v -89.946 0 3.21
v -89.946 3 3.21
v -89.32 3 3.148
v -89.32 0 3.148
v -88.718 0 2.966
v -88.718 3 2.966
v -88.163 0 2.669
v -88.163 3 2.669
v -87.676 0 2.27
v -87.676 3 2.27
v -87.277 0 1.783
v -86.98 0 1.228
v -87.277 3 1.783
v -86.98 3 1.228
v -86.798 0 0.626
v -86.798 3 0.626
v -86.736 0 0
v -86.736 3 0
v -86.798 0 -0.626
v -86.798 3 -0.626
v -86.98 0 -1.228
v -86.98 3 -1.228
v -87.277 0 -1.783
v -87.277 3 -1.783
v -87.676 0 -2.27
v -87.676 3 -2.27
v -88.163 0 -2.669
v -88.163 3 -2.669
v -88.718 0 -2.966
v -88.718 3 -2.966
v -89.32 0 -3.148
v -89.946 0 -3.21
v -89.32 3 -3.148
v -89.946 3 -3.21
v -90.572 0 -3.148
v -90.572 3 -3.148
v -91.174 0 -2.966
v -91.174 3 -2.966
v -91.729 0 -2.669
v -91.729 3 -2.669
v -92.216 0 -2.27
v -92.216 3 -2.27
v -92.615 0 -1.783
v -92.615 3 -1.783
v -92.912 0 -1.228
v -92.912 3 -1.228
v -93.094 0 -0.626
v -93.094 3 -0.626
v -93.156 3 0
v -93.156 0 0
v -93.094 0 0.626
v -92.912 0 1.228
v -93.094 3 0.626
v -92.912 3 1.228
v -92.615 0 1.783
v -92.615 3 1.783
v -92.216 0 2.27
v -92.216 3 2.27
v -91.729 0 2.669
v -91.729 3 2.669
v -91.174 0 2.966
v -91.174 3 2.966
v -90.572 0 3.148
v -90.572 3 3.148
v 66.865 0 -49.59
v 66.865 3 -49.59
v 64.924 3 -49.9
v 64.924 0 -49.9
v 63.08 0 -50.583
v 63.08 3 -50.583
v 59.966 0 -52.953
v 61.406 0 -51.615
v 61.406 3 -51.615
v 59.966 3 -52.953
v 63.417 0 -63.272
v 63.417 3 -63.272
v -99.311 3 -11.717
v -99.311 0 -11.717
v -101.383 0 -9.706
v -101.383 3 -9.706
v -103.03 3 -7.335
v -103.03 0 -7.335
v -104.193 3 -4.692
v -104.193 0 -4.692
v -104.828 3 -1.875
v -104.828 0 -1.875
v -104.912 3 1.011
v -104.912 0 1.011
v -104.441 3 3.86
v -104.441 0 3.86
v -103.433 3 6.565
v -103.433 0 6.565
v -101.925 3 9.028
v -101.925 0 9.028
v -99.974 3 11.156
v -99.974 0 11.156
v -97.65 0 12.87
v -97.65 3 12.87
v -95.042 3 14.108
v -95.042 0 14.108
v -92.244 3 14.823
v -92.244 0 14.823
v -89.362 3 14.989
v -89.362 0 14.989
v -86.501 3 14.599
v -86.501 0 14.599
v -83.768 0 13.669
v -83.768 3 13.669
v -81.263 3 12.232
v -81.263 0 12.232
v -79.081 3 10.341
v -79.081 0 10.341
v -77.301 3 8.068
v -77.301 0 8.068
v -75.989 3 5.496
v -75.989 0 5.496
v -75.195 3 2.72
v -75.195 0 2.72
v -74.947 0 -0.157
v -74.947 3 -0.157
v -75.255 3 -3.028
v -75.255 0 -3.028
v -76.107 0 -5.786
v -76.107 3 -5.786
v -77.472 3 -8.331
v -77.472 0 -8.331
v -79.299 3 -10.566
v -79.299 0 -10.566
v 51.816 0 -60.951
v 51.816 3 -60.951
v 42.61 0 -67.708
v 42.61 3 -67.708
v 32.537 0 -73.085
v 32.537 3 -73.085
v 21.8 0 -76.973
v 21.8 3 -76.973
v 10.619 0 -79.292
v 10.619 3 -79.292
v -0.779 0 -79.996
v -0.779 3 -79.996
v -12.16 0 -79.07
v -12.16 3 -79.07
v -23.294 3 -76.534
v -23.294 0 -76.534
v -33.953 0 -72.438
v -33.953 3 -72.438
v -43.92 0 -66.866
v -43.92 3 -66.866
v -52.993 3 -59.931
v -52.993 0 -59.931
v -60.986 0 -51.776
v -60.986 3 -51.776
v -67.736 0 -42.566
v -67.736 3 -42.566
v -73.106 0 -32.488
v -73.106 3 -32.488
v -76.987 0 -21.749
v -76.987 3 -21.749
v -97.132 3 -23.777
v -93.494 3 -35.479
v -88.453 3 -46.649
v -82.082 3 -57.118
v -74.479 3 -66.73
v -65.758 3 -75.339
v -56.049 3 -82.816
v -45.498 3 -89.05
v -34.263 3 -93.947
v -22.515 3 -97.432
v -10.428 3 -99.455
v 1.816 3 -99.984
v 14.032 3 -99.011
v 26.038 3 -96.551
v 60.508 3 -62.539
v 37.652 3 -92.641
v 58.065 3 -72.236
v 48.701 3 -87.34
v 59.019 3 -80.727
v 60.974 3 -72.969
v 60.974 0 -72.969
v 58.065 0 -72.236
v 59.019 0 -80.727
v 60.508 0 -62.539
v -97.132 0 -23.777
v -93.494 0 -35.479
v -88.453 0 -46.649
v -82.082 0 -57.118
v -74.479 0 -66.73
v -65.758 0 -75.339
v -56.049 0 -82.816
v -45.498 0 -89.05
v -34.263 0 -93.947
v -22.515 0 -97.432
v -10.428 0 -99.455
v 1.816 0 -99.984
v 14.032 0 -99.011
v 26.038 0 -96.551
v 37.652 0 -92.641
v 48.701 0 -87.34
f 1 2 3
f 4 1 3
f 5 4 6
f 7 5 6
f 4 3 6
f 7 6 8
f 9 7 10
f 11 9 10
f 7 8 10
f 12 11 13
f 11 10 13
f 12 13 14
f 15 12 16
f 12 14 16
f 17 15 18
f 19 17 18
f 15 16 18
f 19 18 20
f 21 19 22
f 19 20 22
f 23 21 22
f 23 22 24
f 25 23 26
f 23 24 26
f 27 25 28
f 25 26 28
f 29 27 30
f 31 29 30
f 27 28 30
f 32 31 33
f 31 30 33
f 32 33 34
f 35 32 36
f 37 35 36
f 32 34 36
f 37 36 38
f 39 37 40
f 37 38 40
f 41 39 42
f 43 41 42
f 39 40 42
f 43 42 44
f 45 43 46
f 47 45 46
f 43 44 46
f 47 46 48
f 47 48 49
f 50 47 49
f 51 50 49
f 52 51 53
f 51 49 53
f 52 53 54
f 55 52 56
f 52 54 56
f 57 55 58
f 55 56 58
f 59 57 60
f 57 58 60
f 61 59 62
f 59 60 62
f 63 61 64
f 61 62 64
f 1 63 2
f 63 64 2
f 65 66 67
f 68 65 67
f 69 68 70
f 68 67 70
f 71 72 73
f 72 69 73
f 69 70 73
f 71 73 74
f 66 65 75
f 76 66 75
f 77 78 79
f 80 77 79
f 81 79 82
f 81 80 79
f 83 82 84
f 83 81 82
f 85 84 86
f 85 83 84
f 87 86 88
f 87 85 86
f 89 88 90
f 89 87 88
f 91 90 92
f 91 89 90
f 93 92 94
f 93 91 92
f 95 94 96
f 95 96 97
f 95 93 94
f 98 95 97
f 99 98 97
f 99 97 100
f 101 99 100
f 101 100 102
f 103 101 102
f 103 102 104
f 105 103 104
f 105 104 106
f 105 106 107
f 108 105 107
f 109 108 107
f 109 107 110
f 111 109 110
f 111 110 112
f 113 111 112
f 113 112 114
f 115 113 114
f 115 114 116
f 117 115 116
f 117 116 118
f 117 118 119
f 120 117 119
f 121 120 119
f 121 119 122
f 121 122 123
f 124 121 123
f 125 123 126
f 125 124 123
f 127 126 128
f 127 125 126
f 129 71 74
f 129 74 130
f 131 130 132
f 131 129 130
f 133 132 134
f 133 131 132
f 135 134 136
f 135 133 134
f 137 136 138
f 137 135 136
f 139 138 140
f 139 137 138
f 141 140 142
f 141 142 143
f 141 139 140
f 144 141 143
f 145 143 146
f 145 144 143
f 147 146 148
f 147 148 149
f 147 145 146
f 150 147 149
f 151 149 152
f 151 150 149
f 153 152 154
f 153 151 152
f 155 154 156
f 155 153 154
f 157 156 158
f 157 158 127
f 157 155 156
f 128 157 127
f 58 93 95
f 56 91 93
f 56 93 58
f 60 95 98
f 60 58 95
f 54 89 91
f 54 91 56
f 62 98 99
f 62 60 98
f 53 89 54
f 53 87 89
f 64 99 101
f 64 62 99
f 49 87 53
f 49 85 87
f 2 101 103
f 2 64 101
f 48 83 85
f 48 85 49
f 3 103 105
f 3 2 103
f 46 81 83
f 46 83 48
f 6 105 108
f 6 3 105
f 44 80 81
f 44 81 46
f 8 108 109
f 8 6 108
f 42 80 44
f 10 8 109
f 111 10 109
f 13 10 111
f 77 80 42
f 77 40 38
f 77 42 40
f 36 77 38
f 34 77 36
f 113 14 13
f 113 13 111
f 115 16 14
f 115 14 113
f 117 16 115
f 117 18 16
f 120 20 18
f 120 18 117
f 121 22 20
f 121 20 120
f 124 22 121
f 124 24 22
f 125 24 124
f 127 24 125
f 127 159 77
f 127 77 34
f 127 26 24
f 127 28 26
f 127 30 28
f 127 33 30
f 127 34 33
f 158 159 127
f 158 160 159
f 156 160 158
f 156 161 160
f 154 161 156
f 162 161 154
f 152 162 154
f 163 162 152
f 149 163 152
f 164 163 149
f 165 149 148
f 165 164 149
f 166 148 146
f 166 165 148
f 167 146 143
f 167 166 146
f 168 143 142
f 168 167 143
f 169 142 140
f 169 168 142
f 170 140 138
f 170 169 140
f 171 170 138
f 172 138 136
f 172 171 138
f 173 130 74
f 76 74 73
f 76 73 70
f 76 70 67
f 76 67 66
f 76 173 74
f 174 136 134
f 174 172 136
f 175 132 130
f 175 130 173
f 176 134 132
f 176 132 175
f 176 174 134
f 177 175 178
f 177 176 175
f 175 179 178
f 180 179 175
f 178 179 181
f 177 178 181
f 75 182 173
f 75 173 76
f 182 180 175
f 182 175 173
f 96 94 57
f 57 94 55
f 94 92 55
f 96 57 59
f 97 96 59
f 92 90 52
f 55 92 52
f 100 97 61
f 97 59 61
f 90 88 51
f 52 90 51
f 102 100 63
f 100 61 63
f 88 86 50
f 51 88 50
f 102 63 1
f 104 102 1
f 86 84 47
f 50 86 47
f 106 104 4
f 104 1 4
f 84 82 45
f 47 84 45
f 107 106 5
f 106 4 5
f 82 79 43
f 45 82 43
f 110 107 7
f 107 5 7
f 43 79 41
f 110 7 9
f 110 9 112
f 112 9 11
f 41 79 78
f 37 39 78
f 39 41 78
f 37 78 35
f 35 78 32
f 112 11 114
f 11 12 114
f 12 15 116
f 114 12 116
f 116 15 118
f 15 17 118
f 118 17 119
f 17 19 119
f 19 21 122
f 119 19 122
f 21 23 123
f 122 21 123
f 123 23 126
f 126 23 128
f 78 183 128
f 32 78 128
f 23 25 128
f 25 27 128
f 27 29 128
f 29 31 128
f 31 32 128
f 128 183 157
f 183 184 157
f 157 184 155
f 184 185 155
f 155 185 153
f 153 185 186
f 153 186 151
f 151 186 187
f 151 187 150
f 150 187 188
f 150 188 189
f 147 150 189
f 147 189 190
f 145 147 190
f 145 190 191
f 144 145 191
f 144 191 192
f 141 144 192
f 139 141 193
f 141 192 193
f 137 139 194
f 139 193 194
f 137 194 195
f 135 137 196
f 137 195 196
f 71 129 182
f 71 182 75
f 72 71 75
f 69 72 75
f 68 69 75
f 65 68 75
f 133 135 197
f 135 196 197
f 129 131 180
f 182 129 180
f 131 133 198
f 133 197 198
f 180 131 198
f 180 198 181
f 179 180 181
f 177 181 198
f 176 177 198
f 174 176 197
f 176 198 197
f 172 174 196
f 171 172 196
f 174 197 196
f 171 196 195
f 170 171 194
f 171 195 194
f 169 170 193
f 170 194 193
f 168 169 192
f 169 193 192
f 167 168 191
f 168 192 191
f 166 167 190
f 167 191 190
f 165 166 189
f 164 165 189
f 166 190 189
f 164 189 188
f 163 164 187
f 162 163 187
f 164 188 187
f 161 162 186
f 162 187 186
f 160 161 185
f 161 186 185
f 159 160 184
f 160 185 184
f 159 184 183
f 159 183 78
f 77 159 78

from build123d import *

# Parameters (mm, degrees)
SKETCH3_R              = 100
SKETCH3_R_2            = 80
BOSS_EXTRUDE1_DEPTH    = 3
SPLIT2_SURFACE_1_BACK  = 283.859
SPLIT2_SURFACE_1_DEPTH = 567.718
SPLIT2_SURFACE_2_BACK  = 283.859
SPLIT2_SURFACE_2_DEPTH = 567.718
BODY_DELETE1_DEPTH     = 3
SKETCH5_R              = 15
BOSS_EXTRUDE2_DEPTH    = 3
SKETCH6_R              = 3.21
CUT_EXTRUDE1_DEPTH     = 3
SPLIT3_SURFACE_3_BACK  = 209.781
SPLIT3_SURFACE_3_DEPTH = 419.562
SPLIT3_SURFACE_4_BACK  = 209.781
SPLIT3_SURFACE_4_DEPTH = 419.562
SPLIT4_SURFACE_5_BACK  = 209.781
SPLIT4_SURFACE_5_DEPTH = 419.562
SPLIT4_SURFACE_6_BACK  = 209.781
SPLIT4_SURFACE_6_DEPTH = 419.562
FILLET1_R              = 10
SPLIT5_SURFACE_7_BACK  = 207.768
SPLIT5_SURFACE_7_DEPTH = 415.536
SPLIT5_SURFACE_8_BACK  = 207.768
SPLIT5_SURFACE_8_DEPTH = 415.536


# Read off the part's stored shape, not the designer's step: Body-Delete1
with BuildPart() as part:
    # Sketch3 → Boss-Extrude1 (new body)
    with BuildSketch(Plane(origin=(0, 0, 0), x_dir=(1, 0, 0), z_dir=(0, 1, 0))):
        with Locations(Location((0, 0, 0), (0, 0, 270))):
            Circle(SKETCH3_R)
        with Locations(Location((0, 0, 0), (0, 0, 270))):
            Circle(SKETCH3_R_2, mode=Mode.SUBTRACT)
    extrude(amount=BOSS_EXTRUDE1_DEPTH)


with BuildPart() as body_2:
    # Split2: the piece behind the surface
    add(part.part)
    # Split2 surface: a surface, the sketch's curves swept straight by 567.718 mm
    with BuildLine(Plane(origin=(0, 3, 0), x_dir=(1, 0, 0), z_dir=(0, 1, 0)).offset(-SPLIT2_SURFACE_1_BACK), mode=Mode.PRIVATE) as split2_surface_1_path:
        Line((69.282032303, 72.111025509), (69.282032303, 40))
        Line((69.282032303, 40), (69.282032303, 0))
        Line((69.282032303, 0), (-114.167790304, 0))
        Line((-114.167790304, 0), (-114.167790304, -108.297460661))
        Line((-114.167790304, -108.297460661), (110.524137422, -108.297460661))
        Line((110.524137422, -108.297460661), (110.524137422, 72.111025509))
        Line((110.524137422, 72.111025509), (69.282032303, 72.111025509))
    split2_surface_1 = Shell.extrude(split2_surface_1_path.wire(), (0 * SPLIT2_SURFACE_1_DEPTH, 1 * SPLIT2_SURFACE_1_DEPTH, 0 * SPLIT2_SURFACE_1_DEPTH))
    split(bisect_by=split2_surface_1, keep=Keep.BOTTOM)

    # Sketch5 → Boss-Extrude2 (add)
    with BuildSketch(Plane(origin=(0, 3, 0), x_dir=(1, 0, 0), z_dir=(0, 1, 0))):
        with Locations((-89.945938306, 0)):
            Circle(SKETCH5_R)
    extrude(amount=-BOSS_EXTRUDE2_DEPTH)

    # Sketch6 → Cut-Extrude1 (cut)
    with BuildSketch(Plane(origin=(0, 3, 0), x_dir=(1, 0, 0), z_dir=(0, 1, 0))):
        with Locations(Location((-89.945938306, 0, 0), (0, 0, 270))):
            Circle(SKETCH6_R)
    extrude(amount=-CUT_EXTRUDE1_DEPTH, mode=Mode.SUBTRACT)


with BuildPart() as part_1:
    add(part.part)

    # Split2: split by a surface, the side it looks to stays
    # Split2 surface: a surface, the sketch's curves swept straight by 567.718 mm
    with BuildLine(Plane(origin=(0, 3, 0), x_dir=(1, 0, 0), z_dir=(0, 1, 0)).offset(-SPLIT2_SURFACE_2_BACK), mode=Mode.PRIVATE) as split2_surface_2_path:
        Line((69.282032303, 72.111025509), (69.282032303, 40))
        Line((69.282032303, 40), (69.282032303, 0))
        Line((69.282032303, 0), (-114.167790304, 0))
        Line((-114.167790304, 0), (-114.167790304, -108.297460661))
        Line((-114.167790304, -108.297460661), (110.524137422, -108.297460661))
        Line((110.524137422, -108.297460661), (110.524137422, 72.111025509))
        Line((110.524137422, 72.111025509), (69.282032303, 72.111025509))
    split2_surface_2 = Shell.extrude(split2_surface_2_path.wire(), (0 * SPLIT2_SURFACE_2_DEPTH, 1 * SPLIT2_SURFACE_2_DEPTH, 0 * SPLIT2_SURFACE_2_DEPTH))
    split(bisect_by=split2_surface_2, keep=Keep.TOP)

    # Body-Delete1 outline → Body-Delete1 (cut)
    with BuildSketch(Plane(origin=(0, 0, 0), x_dir=(1, 0, 0), z_dir=(0, 1, 0))):
        with BuildLine():
            ThreePointArc((-100, 0), (39.190539482, -92.000552255), (69.282032303, 72.111025509))
            Line((69.282032303, 72.111025509), (69.282032303, 40))
            ThreePointArc((69.282032303, 40), (20.705523608, -77.274066103), (-80, 0))
            Line((-80, 0), (-100, 0))
        make_face()
    extrude(amount=BODY_DELETE1_DEPTH, mode=Mode.SUBTRACT)


with BuildPart() as body_2_2:
    # Split3: the piece behind the surface
    add(body_2.part)
    # Split3 surface: a surface, the sketch's curves swept straight by 419.562 mm
    with BuildLine(Plane(origin=(0, 3, 0), x_dir=(1, 0, 0), z_dir=(0, 1, 0)).offset(-SPLIT3_SURFACE_3_BACK), mode=Mode.PRIVATE) as split3_surface_3_path:
        Line((69.282032303, 40), (59.018656665, 80.726688062))
        Line((59.018656665, 80.726688062), (73.479070656, 80.726688062))
        Line((73.479070656, 80.726688062), (69.282032303, 40))
    split3_surface_3 = Shell.extrude(split3_surface_3_path.wire(), (0 * SPLIT3_SURFACE_3_DEPTH, 1 * SPLIT3_SURFACE_3_DEPTH, 0 * SPLIT3_SURFACE_3_DEPTH))
    split(bisect_by=split3_surface_3, keep=Keep.BOTTOM)


with BuildPart() as body_2_1:
    add(body_2.part)

    # Split3: split by a surface, the side it looks to stays
    # Split3 surface: a surface, the sketch's curves swept straight by 419.562 mm
    with BuildLine(Plane(origin=(0, 3, 0), x_dir=(1, 0, 0), z_dir=(0, 1, 0)).offset(-SPLIT3_SURFACE_4_BACK), mode=Mode.PRIVATE) as split3_surface_4_path:
        Line((69.282032303, 40), (59.018656665, 80.726688062))
        Line((59.018656665, 80.726688062), (73.479070656, 80.726688062))
        Line((73.479070656, 80.726688062), (69.282032303, 40))
    split3_surface_4 = Shell.extrude(split3_surface_4_path.wire(), (0 * SPLIT3_SURFACE_4_DEPTH, 1 * SPLIT3_SURFACE_4_DEPTH, 0 * SPLIT3_SURFACE_4_DEPTH))
    split(bisect_by=split3_surface_4, keep=Keep.TOP)


with BuildPart() as body_2_3:
    # Split4: the piece behind the surface
    add(body_2_1.part)
    # Split4 surface: a surface, the sketch's curves swept straight by 419.562 mm
    with BuildLine(Plane(origin=(0, 3, 0), x_dir=(1, 0, 0), z_dir=(0, 1, 0)).offset(-SPLIT4_SURFACE_5_BACK), mode=Mode.PRIVATE) as split4_surface_5_path:
        Line((66.865251706, 49.590165356), (62.98651951, 48.612701009))
        Line((62.98651951, 48.612701009), (66.652010809, 34.067455273))
        Line((66.652010809, 34.067455273), (71.500426054, 35.289285706))
        Line((71.500426054, 35.289285706), (67.834934755, 49.834531442))
        Line((67.834934755, 49.834531442), (66.865251706, 49.590165356))
    split4_surface_5 = Shell.extrude(split4_surface_5_path.wire(), (0 * SPLIT4_SURFACE_5_DEPTH, 1 * SPLIT4_SURFACE_5_DEPTH, 0 * SPLIT4_SURFACE_5_DEPTH))
    split(bisect_by=split4_surface_5, keep=Keep.BOTTOM)

    # Fillet1
    # the kernel refuses this fillet: 10 mm, written as the material it takes off along each edge
    with BuildSketch(Plane(origin=(63.446918188, 16.684080126, -48.728724305), x_dir=(-0.6358841650465459, 0, -0.7717845092012777), z_dir=(0, -1, 0))) as fillet1_piece_1:
        with BuildLine():
            CenterArc((5.815734054, 9.994146598), FILLET1_R, 222.907386502, 45.132130872)
            Line((-1.508817296, 3.185993579), (-1.655308323, 3.049830519))
            ThreePointArc((-1.655308323, 3.049830519), (-0.935163624, 1.507395163), (-0.180754976, -0.085601627))
            Line((-0.180754976, -0.085601627), (0.00684204, -0.199882932))
            ThreePointArc((0.00684204, -0.199882932), (2.736816025, -0.153172783), (5.46679001, -0.199882932))
            Line((5.46679001, -0.199882932), (5.47363205, 0))
        make_face()
    extrude(amount=30.368160252, mode=Mode.SUBTRACT)


with BuildPart() as body_2_4:
    add(body_2_1.part)

    # Split4: split by a surface, the side it looks to stays
    # Split4 surface: a surface, the sketch's curves swept straight by 419.562 mm
    with BuildLine(Plane(origin=(0, 3, 0), x_dir=(1, 0, 0), z_dir=(0, 1, 0)).offset(-SPLIT4_SURFACE_6_BACK), mode=Mode.PRIVATE) as split4_surface_6_path:
        Line((66.865251706, 49.590165356), (62.98651951, 48.612701009))
        Line((62.98651951, 48.612701009), (66.652010809, 34.067455273))
        Line((66.652010809, 34.067455273), (71.500426054, 35.289285706))
        Line((71.500426054, 35.289285706), (67.834934755, 49.834531442))
        Line((67.834934755, 49.834531442), (66.865251706, 49.590165356))
    split4_surface_6 = Shell.extrude(split4_surface_6_path.wire(), (0 * SPLIT4_SURFACE_6_DEPTH, 1 * SPLIT4_SURFACE_6_DEPTH, 0 * SPLIT4_SURFACE_6_DEPTH))
    split(bisect_by=split4_surface_6, keep=Keep.TOP)


with BuildPart() as body_2_4_1:
    # Split5: the piece behind the surface
    add(body_2_3.part)
    # Split5 surface: a surface, the sketch's curves swept straight by 415.536 mm
    with BuildLine(Plane(origin=(0, 3, 0), x_dir=(1, 0, 0), z_dir=(0, 1, 0)).offset(-SPLIT5_SURFACE_7_BACK), mode=Mode.PRIVATE) as split5_surface_7_path:
        Line((60.973585358, 72.969223669), (58.06453621, 72.23612541))
        Line((58.06453621, 72.23612541), (60.508197077, 62.539294919))
        Line((60.508197077, 62.539294919), (68.981543377, 64.674630251))
        Line((68.981543377, 64.674630251), (66.537882511, 74.371460742))
        Line((66.537882511, 74.371460742), (60.973585358, 72.969223669))
    split5_surface_7 = Shell.extrude(split5_surface_7_path.wire(), (0 * SPLIT5_SURFACE_7_DEPTH, 1 * SPLIT5_SURFACE_7_DEPTH, 0 * SPLIT5_SURFACE_7_DEPTH))
    split(bisect_by=split5_surface_7, keep=Keep.BOTTOM)


with BuildPart() as body_2_3_1:
    add(body_2_3.part)

    # Split5: split by a surface, the side it looks to stays
    # Split5 surface: a surface, the sketch's curves swept straight by 415.536 mm
    with BuildLine(Plane(origin=(0, 3, 0), x_dir=(1, 0, 0), z_dir=(0, 1, 0)).offset(-SPLIT5_SURFACE_8_BACK), mode=Mode.PRIVATE) as split5_surface_8_path:
        Line((60.973585358, 72.969223669), (58.06453621, 72.23612541))
        Line((58.06453621, 72.23612541), (60.508197077, 62.539294919))
        Line((60.508197077, 62.539294919), (68.981543377, 64.674630251))
        Line((68.981543377, 64.674630251), (66.537882511, 74.371460742))
        Line((66.537882511, 74.371460742), (60.973585358, 72.969223669))
    split5_surface_8 = Shell.extrude(split5_surface_8_path.wire(), (0 * SPLIT5_SURFACE_8_DEPTH, 1 * SPLIT5_SURFACE_8_DEPTH, 0 * SPLIT5_SURFACE_8_DEPTH))
    split(bisect_by=split5_surface_8, keep=Keep.TOP)


solid = body_2_4_1.part
